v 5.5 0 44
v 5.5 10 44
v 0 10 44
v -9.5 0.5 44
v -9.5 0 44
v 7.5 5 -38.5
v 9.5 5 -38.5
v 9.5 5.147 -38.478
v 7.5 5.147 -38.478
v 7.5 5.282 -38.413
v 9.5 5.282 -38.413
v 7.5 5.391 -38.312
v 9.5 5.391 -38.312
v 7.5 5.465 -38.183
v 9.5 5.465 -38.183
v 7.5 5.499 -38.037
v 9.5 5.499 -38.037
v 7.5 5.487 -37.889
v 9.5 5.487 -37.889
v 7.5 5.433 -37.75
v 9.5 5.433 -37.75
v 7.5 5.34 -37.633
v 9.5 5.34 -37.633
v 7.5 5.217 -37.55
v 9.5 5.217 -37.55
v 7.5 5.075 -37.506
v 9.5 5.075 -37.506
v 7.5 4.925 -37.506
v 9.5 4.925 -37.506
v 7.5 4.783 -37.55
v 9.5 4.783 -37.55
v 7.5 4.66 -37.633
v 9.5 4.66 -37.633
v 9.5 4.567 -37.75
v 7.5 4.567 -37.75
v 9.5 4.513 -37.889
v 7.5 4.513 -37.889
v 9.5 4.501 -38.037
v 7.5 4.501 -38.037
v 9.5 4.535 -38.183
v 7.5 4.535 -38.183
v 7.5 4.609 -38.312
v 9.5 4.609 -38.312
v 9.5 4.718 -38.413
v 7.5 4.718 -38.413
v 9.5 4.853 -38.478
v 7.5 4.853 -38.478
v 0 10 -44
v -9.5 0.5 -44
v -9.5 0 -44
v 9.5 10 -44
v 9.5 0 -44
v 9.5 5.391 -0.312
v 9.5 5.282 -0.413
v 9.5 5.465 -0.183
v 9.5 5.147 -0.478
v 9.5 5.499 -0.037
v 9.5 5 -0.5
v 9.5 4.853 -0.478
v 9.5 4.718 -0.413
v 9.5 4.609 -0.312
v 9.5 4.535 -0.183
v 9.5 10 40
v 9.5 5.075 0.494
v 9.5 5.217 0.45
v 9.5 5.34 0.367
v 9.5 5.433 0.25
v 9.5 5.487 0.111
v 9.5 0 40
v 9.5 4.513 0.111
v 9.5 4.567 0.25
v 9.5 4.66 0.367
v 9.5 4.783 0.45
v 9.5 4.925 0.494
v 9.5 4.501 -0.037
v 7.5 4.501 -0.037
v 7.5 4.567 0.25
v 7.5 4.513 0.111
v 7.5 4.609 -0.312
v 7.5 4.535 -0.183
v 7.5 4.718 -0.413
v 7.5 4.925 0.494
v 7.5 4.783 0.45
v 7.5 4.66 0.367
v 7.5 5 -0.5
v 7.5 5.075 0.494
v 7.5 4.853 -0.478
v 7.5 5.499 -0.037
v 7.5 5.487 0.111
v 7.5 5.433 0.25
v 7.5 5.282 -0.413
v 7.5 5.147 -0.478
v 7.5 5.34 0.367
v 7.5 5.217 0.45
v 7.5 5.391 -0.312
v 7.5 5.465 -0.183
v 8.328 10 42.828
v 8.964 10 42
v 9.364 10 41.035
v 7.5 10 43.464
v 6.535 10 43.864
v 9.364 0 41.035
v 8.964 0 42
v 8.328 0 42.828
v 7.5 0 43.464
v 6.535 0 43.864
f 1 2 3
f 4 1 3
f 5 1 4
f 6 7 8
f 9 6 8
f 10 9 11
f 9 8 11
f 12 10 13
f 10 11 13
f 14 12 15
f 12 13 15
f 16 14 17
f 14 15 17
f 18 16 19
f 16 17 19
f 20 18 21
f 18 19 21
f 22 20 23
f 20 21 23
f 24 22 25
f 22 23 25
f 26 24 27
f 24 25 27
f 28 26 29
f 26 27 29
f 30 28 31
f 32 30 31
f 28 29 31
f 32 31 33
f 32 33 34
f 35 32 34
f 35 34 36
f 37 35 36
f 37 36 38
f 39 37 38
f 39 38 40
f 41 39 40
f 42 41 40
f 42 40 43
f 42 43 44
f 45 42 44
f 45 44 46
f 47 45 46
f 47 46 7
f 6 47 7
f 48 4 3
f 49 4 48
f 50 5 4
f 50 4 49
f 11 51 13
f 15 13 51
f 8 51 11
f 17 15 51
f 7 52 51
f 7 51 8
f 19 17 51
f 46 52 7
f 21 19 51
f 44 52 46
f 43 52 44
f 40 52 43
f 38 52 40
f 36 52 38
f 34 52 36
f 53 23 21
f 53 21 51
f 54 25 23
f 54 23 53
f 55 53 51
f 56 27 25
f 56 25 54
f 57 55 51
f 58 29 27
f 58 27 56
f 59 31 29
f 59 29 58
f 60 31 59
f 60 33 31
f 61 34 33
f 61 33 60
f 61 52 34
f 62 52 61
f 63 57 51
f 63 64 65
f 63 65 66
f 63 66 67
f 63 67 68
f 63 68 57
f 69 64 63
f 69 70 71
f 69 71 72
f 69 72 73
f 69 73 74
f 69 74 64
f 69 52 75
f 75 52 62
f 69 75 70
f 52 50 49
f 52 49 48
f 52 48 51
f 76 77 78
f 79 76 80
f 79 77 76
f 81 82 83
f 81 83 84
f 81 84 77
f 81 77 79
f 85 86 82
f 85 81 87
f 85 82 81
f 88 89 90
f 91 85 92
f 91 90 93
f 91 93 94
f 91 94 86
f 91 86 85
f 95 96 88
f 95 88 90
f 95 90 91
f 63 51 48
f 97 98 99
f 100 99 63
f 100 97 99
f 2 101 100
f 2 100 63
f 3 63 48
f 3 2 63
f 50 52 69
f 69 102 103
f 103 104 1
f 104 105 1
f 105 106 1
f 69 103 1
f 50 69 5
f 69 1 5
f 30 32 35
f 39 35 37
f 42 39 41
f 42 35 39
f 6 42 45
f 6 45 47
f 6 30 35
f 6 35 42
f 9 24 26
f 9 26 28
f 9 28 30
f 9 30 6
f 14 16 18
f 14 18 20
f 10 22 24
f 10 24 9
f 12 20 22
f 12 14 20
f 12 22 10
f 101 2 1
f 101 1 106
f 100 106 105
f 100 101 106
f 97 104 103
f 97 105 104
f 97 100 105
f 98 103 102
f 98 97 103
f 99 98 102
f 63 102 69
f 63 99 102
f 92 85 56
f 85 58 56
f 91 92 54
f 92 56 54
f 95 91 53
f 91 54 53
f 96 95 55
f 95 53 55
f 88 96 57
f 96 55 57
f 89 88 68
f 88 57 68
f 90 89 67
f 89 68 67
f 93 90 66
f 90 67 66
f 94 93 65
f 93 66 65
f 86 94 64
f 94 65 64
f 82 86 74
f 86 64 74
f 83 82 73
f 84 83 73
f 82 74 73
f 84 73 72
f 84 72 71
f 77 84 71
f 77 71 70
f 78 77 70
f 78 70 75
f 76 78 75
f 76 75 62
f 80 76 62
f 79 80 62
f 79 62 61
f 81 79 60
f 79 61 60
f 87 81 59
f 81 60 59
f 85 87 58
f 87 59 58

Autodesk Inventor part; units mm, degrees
ref_plane "YZ Plane" through (0, 0, 0) normal (1, 0, 0) x (0, 1, 0)
ref_plane "XZ Plane" through (0, 0, 0) normal (0, 1, 0) x (-1, 0, 0)
ref_plane "XY Plane" through (0, 0, 0) normal (0, 0, 1) x (1, 0, 0)
sketch "Sketch1" plane through (0, 0, 0) normal (0, 1, 0) x (-1, 0, 0)
  line L0 (9.5, -44) -> (-9.5, -44)
  line L1 (-9.5, -44) -> (-9.5, 44)
  line L2 (-9.5, 44) -> (9.5, 44)
  line L3 (9.5, 44) -> (9.5, -44)
  line L4 (9.5, -44) -> (-9.5, 44) construction
  line L5 (-9.5, -44) -> (9.5, 44) construction
  point P0 (0, 0)
  dimension "d0" = 19
  dimension "d1" = 88
extrude "Extrusion1" add sketch "Sketch1" along normal blind 10
fillet "Fillet1" radius 4 1 edges at (9.5, 5, 44)
chamfer "Chamfer1" distance 9.5 angle 45 1 edges at (-9.5, 10, 0)
sketch "Sketch2" plane through (9.5, 0, -44) normal (1, 0, 0) x (0, 0, -1)
  line L0 (0, 0) -> (-50, 0)
  line L1 (-50, 0) -> (-50, 5)
  line L2 (-50, 5) -> (0, 5)
  line L3 (0, 5) -> (0, 0)
  line L4 (-6, 5.5) -> (-44, 5.5)
  line L5 (-44, 5.5) -> (-44, 4.5)
  line L6 (-44, 4.5) -> (-6, 4.5)
  line L7 (-6, 4.5) -> (-6, 5.5)
  line L8 (-6, 5.5) -> (-44, 4.5) construction
  line L9 (-44, 5.5) -> (-6, 4.5) construction
  circle A0 centre (-44, 5) radius 0.5
  circle A1 centre (-6, 5) radius 0.5
  point P0 (-44, 0)
  point P1 (-25, 5)
  dimension "d8" = 50
  dimension "d9" = 5
  dimension "d10" = 38
  dimension "d11" = 1
  dimension "d12" = 1
  dimension "d13" = 1
extrude "Extrusion2" cut sketch "Sketch2" against normal blind 2 contours A1 L7 L2 | L2 L7 A1 | A0 L5 L2 | L2 L5 A0 | L7 A1 L2 | L2 A1 L7 | L5 A0 L2 | L2 A0 L5
properties part number "komatex_senzor"
